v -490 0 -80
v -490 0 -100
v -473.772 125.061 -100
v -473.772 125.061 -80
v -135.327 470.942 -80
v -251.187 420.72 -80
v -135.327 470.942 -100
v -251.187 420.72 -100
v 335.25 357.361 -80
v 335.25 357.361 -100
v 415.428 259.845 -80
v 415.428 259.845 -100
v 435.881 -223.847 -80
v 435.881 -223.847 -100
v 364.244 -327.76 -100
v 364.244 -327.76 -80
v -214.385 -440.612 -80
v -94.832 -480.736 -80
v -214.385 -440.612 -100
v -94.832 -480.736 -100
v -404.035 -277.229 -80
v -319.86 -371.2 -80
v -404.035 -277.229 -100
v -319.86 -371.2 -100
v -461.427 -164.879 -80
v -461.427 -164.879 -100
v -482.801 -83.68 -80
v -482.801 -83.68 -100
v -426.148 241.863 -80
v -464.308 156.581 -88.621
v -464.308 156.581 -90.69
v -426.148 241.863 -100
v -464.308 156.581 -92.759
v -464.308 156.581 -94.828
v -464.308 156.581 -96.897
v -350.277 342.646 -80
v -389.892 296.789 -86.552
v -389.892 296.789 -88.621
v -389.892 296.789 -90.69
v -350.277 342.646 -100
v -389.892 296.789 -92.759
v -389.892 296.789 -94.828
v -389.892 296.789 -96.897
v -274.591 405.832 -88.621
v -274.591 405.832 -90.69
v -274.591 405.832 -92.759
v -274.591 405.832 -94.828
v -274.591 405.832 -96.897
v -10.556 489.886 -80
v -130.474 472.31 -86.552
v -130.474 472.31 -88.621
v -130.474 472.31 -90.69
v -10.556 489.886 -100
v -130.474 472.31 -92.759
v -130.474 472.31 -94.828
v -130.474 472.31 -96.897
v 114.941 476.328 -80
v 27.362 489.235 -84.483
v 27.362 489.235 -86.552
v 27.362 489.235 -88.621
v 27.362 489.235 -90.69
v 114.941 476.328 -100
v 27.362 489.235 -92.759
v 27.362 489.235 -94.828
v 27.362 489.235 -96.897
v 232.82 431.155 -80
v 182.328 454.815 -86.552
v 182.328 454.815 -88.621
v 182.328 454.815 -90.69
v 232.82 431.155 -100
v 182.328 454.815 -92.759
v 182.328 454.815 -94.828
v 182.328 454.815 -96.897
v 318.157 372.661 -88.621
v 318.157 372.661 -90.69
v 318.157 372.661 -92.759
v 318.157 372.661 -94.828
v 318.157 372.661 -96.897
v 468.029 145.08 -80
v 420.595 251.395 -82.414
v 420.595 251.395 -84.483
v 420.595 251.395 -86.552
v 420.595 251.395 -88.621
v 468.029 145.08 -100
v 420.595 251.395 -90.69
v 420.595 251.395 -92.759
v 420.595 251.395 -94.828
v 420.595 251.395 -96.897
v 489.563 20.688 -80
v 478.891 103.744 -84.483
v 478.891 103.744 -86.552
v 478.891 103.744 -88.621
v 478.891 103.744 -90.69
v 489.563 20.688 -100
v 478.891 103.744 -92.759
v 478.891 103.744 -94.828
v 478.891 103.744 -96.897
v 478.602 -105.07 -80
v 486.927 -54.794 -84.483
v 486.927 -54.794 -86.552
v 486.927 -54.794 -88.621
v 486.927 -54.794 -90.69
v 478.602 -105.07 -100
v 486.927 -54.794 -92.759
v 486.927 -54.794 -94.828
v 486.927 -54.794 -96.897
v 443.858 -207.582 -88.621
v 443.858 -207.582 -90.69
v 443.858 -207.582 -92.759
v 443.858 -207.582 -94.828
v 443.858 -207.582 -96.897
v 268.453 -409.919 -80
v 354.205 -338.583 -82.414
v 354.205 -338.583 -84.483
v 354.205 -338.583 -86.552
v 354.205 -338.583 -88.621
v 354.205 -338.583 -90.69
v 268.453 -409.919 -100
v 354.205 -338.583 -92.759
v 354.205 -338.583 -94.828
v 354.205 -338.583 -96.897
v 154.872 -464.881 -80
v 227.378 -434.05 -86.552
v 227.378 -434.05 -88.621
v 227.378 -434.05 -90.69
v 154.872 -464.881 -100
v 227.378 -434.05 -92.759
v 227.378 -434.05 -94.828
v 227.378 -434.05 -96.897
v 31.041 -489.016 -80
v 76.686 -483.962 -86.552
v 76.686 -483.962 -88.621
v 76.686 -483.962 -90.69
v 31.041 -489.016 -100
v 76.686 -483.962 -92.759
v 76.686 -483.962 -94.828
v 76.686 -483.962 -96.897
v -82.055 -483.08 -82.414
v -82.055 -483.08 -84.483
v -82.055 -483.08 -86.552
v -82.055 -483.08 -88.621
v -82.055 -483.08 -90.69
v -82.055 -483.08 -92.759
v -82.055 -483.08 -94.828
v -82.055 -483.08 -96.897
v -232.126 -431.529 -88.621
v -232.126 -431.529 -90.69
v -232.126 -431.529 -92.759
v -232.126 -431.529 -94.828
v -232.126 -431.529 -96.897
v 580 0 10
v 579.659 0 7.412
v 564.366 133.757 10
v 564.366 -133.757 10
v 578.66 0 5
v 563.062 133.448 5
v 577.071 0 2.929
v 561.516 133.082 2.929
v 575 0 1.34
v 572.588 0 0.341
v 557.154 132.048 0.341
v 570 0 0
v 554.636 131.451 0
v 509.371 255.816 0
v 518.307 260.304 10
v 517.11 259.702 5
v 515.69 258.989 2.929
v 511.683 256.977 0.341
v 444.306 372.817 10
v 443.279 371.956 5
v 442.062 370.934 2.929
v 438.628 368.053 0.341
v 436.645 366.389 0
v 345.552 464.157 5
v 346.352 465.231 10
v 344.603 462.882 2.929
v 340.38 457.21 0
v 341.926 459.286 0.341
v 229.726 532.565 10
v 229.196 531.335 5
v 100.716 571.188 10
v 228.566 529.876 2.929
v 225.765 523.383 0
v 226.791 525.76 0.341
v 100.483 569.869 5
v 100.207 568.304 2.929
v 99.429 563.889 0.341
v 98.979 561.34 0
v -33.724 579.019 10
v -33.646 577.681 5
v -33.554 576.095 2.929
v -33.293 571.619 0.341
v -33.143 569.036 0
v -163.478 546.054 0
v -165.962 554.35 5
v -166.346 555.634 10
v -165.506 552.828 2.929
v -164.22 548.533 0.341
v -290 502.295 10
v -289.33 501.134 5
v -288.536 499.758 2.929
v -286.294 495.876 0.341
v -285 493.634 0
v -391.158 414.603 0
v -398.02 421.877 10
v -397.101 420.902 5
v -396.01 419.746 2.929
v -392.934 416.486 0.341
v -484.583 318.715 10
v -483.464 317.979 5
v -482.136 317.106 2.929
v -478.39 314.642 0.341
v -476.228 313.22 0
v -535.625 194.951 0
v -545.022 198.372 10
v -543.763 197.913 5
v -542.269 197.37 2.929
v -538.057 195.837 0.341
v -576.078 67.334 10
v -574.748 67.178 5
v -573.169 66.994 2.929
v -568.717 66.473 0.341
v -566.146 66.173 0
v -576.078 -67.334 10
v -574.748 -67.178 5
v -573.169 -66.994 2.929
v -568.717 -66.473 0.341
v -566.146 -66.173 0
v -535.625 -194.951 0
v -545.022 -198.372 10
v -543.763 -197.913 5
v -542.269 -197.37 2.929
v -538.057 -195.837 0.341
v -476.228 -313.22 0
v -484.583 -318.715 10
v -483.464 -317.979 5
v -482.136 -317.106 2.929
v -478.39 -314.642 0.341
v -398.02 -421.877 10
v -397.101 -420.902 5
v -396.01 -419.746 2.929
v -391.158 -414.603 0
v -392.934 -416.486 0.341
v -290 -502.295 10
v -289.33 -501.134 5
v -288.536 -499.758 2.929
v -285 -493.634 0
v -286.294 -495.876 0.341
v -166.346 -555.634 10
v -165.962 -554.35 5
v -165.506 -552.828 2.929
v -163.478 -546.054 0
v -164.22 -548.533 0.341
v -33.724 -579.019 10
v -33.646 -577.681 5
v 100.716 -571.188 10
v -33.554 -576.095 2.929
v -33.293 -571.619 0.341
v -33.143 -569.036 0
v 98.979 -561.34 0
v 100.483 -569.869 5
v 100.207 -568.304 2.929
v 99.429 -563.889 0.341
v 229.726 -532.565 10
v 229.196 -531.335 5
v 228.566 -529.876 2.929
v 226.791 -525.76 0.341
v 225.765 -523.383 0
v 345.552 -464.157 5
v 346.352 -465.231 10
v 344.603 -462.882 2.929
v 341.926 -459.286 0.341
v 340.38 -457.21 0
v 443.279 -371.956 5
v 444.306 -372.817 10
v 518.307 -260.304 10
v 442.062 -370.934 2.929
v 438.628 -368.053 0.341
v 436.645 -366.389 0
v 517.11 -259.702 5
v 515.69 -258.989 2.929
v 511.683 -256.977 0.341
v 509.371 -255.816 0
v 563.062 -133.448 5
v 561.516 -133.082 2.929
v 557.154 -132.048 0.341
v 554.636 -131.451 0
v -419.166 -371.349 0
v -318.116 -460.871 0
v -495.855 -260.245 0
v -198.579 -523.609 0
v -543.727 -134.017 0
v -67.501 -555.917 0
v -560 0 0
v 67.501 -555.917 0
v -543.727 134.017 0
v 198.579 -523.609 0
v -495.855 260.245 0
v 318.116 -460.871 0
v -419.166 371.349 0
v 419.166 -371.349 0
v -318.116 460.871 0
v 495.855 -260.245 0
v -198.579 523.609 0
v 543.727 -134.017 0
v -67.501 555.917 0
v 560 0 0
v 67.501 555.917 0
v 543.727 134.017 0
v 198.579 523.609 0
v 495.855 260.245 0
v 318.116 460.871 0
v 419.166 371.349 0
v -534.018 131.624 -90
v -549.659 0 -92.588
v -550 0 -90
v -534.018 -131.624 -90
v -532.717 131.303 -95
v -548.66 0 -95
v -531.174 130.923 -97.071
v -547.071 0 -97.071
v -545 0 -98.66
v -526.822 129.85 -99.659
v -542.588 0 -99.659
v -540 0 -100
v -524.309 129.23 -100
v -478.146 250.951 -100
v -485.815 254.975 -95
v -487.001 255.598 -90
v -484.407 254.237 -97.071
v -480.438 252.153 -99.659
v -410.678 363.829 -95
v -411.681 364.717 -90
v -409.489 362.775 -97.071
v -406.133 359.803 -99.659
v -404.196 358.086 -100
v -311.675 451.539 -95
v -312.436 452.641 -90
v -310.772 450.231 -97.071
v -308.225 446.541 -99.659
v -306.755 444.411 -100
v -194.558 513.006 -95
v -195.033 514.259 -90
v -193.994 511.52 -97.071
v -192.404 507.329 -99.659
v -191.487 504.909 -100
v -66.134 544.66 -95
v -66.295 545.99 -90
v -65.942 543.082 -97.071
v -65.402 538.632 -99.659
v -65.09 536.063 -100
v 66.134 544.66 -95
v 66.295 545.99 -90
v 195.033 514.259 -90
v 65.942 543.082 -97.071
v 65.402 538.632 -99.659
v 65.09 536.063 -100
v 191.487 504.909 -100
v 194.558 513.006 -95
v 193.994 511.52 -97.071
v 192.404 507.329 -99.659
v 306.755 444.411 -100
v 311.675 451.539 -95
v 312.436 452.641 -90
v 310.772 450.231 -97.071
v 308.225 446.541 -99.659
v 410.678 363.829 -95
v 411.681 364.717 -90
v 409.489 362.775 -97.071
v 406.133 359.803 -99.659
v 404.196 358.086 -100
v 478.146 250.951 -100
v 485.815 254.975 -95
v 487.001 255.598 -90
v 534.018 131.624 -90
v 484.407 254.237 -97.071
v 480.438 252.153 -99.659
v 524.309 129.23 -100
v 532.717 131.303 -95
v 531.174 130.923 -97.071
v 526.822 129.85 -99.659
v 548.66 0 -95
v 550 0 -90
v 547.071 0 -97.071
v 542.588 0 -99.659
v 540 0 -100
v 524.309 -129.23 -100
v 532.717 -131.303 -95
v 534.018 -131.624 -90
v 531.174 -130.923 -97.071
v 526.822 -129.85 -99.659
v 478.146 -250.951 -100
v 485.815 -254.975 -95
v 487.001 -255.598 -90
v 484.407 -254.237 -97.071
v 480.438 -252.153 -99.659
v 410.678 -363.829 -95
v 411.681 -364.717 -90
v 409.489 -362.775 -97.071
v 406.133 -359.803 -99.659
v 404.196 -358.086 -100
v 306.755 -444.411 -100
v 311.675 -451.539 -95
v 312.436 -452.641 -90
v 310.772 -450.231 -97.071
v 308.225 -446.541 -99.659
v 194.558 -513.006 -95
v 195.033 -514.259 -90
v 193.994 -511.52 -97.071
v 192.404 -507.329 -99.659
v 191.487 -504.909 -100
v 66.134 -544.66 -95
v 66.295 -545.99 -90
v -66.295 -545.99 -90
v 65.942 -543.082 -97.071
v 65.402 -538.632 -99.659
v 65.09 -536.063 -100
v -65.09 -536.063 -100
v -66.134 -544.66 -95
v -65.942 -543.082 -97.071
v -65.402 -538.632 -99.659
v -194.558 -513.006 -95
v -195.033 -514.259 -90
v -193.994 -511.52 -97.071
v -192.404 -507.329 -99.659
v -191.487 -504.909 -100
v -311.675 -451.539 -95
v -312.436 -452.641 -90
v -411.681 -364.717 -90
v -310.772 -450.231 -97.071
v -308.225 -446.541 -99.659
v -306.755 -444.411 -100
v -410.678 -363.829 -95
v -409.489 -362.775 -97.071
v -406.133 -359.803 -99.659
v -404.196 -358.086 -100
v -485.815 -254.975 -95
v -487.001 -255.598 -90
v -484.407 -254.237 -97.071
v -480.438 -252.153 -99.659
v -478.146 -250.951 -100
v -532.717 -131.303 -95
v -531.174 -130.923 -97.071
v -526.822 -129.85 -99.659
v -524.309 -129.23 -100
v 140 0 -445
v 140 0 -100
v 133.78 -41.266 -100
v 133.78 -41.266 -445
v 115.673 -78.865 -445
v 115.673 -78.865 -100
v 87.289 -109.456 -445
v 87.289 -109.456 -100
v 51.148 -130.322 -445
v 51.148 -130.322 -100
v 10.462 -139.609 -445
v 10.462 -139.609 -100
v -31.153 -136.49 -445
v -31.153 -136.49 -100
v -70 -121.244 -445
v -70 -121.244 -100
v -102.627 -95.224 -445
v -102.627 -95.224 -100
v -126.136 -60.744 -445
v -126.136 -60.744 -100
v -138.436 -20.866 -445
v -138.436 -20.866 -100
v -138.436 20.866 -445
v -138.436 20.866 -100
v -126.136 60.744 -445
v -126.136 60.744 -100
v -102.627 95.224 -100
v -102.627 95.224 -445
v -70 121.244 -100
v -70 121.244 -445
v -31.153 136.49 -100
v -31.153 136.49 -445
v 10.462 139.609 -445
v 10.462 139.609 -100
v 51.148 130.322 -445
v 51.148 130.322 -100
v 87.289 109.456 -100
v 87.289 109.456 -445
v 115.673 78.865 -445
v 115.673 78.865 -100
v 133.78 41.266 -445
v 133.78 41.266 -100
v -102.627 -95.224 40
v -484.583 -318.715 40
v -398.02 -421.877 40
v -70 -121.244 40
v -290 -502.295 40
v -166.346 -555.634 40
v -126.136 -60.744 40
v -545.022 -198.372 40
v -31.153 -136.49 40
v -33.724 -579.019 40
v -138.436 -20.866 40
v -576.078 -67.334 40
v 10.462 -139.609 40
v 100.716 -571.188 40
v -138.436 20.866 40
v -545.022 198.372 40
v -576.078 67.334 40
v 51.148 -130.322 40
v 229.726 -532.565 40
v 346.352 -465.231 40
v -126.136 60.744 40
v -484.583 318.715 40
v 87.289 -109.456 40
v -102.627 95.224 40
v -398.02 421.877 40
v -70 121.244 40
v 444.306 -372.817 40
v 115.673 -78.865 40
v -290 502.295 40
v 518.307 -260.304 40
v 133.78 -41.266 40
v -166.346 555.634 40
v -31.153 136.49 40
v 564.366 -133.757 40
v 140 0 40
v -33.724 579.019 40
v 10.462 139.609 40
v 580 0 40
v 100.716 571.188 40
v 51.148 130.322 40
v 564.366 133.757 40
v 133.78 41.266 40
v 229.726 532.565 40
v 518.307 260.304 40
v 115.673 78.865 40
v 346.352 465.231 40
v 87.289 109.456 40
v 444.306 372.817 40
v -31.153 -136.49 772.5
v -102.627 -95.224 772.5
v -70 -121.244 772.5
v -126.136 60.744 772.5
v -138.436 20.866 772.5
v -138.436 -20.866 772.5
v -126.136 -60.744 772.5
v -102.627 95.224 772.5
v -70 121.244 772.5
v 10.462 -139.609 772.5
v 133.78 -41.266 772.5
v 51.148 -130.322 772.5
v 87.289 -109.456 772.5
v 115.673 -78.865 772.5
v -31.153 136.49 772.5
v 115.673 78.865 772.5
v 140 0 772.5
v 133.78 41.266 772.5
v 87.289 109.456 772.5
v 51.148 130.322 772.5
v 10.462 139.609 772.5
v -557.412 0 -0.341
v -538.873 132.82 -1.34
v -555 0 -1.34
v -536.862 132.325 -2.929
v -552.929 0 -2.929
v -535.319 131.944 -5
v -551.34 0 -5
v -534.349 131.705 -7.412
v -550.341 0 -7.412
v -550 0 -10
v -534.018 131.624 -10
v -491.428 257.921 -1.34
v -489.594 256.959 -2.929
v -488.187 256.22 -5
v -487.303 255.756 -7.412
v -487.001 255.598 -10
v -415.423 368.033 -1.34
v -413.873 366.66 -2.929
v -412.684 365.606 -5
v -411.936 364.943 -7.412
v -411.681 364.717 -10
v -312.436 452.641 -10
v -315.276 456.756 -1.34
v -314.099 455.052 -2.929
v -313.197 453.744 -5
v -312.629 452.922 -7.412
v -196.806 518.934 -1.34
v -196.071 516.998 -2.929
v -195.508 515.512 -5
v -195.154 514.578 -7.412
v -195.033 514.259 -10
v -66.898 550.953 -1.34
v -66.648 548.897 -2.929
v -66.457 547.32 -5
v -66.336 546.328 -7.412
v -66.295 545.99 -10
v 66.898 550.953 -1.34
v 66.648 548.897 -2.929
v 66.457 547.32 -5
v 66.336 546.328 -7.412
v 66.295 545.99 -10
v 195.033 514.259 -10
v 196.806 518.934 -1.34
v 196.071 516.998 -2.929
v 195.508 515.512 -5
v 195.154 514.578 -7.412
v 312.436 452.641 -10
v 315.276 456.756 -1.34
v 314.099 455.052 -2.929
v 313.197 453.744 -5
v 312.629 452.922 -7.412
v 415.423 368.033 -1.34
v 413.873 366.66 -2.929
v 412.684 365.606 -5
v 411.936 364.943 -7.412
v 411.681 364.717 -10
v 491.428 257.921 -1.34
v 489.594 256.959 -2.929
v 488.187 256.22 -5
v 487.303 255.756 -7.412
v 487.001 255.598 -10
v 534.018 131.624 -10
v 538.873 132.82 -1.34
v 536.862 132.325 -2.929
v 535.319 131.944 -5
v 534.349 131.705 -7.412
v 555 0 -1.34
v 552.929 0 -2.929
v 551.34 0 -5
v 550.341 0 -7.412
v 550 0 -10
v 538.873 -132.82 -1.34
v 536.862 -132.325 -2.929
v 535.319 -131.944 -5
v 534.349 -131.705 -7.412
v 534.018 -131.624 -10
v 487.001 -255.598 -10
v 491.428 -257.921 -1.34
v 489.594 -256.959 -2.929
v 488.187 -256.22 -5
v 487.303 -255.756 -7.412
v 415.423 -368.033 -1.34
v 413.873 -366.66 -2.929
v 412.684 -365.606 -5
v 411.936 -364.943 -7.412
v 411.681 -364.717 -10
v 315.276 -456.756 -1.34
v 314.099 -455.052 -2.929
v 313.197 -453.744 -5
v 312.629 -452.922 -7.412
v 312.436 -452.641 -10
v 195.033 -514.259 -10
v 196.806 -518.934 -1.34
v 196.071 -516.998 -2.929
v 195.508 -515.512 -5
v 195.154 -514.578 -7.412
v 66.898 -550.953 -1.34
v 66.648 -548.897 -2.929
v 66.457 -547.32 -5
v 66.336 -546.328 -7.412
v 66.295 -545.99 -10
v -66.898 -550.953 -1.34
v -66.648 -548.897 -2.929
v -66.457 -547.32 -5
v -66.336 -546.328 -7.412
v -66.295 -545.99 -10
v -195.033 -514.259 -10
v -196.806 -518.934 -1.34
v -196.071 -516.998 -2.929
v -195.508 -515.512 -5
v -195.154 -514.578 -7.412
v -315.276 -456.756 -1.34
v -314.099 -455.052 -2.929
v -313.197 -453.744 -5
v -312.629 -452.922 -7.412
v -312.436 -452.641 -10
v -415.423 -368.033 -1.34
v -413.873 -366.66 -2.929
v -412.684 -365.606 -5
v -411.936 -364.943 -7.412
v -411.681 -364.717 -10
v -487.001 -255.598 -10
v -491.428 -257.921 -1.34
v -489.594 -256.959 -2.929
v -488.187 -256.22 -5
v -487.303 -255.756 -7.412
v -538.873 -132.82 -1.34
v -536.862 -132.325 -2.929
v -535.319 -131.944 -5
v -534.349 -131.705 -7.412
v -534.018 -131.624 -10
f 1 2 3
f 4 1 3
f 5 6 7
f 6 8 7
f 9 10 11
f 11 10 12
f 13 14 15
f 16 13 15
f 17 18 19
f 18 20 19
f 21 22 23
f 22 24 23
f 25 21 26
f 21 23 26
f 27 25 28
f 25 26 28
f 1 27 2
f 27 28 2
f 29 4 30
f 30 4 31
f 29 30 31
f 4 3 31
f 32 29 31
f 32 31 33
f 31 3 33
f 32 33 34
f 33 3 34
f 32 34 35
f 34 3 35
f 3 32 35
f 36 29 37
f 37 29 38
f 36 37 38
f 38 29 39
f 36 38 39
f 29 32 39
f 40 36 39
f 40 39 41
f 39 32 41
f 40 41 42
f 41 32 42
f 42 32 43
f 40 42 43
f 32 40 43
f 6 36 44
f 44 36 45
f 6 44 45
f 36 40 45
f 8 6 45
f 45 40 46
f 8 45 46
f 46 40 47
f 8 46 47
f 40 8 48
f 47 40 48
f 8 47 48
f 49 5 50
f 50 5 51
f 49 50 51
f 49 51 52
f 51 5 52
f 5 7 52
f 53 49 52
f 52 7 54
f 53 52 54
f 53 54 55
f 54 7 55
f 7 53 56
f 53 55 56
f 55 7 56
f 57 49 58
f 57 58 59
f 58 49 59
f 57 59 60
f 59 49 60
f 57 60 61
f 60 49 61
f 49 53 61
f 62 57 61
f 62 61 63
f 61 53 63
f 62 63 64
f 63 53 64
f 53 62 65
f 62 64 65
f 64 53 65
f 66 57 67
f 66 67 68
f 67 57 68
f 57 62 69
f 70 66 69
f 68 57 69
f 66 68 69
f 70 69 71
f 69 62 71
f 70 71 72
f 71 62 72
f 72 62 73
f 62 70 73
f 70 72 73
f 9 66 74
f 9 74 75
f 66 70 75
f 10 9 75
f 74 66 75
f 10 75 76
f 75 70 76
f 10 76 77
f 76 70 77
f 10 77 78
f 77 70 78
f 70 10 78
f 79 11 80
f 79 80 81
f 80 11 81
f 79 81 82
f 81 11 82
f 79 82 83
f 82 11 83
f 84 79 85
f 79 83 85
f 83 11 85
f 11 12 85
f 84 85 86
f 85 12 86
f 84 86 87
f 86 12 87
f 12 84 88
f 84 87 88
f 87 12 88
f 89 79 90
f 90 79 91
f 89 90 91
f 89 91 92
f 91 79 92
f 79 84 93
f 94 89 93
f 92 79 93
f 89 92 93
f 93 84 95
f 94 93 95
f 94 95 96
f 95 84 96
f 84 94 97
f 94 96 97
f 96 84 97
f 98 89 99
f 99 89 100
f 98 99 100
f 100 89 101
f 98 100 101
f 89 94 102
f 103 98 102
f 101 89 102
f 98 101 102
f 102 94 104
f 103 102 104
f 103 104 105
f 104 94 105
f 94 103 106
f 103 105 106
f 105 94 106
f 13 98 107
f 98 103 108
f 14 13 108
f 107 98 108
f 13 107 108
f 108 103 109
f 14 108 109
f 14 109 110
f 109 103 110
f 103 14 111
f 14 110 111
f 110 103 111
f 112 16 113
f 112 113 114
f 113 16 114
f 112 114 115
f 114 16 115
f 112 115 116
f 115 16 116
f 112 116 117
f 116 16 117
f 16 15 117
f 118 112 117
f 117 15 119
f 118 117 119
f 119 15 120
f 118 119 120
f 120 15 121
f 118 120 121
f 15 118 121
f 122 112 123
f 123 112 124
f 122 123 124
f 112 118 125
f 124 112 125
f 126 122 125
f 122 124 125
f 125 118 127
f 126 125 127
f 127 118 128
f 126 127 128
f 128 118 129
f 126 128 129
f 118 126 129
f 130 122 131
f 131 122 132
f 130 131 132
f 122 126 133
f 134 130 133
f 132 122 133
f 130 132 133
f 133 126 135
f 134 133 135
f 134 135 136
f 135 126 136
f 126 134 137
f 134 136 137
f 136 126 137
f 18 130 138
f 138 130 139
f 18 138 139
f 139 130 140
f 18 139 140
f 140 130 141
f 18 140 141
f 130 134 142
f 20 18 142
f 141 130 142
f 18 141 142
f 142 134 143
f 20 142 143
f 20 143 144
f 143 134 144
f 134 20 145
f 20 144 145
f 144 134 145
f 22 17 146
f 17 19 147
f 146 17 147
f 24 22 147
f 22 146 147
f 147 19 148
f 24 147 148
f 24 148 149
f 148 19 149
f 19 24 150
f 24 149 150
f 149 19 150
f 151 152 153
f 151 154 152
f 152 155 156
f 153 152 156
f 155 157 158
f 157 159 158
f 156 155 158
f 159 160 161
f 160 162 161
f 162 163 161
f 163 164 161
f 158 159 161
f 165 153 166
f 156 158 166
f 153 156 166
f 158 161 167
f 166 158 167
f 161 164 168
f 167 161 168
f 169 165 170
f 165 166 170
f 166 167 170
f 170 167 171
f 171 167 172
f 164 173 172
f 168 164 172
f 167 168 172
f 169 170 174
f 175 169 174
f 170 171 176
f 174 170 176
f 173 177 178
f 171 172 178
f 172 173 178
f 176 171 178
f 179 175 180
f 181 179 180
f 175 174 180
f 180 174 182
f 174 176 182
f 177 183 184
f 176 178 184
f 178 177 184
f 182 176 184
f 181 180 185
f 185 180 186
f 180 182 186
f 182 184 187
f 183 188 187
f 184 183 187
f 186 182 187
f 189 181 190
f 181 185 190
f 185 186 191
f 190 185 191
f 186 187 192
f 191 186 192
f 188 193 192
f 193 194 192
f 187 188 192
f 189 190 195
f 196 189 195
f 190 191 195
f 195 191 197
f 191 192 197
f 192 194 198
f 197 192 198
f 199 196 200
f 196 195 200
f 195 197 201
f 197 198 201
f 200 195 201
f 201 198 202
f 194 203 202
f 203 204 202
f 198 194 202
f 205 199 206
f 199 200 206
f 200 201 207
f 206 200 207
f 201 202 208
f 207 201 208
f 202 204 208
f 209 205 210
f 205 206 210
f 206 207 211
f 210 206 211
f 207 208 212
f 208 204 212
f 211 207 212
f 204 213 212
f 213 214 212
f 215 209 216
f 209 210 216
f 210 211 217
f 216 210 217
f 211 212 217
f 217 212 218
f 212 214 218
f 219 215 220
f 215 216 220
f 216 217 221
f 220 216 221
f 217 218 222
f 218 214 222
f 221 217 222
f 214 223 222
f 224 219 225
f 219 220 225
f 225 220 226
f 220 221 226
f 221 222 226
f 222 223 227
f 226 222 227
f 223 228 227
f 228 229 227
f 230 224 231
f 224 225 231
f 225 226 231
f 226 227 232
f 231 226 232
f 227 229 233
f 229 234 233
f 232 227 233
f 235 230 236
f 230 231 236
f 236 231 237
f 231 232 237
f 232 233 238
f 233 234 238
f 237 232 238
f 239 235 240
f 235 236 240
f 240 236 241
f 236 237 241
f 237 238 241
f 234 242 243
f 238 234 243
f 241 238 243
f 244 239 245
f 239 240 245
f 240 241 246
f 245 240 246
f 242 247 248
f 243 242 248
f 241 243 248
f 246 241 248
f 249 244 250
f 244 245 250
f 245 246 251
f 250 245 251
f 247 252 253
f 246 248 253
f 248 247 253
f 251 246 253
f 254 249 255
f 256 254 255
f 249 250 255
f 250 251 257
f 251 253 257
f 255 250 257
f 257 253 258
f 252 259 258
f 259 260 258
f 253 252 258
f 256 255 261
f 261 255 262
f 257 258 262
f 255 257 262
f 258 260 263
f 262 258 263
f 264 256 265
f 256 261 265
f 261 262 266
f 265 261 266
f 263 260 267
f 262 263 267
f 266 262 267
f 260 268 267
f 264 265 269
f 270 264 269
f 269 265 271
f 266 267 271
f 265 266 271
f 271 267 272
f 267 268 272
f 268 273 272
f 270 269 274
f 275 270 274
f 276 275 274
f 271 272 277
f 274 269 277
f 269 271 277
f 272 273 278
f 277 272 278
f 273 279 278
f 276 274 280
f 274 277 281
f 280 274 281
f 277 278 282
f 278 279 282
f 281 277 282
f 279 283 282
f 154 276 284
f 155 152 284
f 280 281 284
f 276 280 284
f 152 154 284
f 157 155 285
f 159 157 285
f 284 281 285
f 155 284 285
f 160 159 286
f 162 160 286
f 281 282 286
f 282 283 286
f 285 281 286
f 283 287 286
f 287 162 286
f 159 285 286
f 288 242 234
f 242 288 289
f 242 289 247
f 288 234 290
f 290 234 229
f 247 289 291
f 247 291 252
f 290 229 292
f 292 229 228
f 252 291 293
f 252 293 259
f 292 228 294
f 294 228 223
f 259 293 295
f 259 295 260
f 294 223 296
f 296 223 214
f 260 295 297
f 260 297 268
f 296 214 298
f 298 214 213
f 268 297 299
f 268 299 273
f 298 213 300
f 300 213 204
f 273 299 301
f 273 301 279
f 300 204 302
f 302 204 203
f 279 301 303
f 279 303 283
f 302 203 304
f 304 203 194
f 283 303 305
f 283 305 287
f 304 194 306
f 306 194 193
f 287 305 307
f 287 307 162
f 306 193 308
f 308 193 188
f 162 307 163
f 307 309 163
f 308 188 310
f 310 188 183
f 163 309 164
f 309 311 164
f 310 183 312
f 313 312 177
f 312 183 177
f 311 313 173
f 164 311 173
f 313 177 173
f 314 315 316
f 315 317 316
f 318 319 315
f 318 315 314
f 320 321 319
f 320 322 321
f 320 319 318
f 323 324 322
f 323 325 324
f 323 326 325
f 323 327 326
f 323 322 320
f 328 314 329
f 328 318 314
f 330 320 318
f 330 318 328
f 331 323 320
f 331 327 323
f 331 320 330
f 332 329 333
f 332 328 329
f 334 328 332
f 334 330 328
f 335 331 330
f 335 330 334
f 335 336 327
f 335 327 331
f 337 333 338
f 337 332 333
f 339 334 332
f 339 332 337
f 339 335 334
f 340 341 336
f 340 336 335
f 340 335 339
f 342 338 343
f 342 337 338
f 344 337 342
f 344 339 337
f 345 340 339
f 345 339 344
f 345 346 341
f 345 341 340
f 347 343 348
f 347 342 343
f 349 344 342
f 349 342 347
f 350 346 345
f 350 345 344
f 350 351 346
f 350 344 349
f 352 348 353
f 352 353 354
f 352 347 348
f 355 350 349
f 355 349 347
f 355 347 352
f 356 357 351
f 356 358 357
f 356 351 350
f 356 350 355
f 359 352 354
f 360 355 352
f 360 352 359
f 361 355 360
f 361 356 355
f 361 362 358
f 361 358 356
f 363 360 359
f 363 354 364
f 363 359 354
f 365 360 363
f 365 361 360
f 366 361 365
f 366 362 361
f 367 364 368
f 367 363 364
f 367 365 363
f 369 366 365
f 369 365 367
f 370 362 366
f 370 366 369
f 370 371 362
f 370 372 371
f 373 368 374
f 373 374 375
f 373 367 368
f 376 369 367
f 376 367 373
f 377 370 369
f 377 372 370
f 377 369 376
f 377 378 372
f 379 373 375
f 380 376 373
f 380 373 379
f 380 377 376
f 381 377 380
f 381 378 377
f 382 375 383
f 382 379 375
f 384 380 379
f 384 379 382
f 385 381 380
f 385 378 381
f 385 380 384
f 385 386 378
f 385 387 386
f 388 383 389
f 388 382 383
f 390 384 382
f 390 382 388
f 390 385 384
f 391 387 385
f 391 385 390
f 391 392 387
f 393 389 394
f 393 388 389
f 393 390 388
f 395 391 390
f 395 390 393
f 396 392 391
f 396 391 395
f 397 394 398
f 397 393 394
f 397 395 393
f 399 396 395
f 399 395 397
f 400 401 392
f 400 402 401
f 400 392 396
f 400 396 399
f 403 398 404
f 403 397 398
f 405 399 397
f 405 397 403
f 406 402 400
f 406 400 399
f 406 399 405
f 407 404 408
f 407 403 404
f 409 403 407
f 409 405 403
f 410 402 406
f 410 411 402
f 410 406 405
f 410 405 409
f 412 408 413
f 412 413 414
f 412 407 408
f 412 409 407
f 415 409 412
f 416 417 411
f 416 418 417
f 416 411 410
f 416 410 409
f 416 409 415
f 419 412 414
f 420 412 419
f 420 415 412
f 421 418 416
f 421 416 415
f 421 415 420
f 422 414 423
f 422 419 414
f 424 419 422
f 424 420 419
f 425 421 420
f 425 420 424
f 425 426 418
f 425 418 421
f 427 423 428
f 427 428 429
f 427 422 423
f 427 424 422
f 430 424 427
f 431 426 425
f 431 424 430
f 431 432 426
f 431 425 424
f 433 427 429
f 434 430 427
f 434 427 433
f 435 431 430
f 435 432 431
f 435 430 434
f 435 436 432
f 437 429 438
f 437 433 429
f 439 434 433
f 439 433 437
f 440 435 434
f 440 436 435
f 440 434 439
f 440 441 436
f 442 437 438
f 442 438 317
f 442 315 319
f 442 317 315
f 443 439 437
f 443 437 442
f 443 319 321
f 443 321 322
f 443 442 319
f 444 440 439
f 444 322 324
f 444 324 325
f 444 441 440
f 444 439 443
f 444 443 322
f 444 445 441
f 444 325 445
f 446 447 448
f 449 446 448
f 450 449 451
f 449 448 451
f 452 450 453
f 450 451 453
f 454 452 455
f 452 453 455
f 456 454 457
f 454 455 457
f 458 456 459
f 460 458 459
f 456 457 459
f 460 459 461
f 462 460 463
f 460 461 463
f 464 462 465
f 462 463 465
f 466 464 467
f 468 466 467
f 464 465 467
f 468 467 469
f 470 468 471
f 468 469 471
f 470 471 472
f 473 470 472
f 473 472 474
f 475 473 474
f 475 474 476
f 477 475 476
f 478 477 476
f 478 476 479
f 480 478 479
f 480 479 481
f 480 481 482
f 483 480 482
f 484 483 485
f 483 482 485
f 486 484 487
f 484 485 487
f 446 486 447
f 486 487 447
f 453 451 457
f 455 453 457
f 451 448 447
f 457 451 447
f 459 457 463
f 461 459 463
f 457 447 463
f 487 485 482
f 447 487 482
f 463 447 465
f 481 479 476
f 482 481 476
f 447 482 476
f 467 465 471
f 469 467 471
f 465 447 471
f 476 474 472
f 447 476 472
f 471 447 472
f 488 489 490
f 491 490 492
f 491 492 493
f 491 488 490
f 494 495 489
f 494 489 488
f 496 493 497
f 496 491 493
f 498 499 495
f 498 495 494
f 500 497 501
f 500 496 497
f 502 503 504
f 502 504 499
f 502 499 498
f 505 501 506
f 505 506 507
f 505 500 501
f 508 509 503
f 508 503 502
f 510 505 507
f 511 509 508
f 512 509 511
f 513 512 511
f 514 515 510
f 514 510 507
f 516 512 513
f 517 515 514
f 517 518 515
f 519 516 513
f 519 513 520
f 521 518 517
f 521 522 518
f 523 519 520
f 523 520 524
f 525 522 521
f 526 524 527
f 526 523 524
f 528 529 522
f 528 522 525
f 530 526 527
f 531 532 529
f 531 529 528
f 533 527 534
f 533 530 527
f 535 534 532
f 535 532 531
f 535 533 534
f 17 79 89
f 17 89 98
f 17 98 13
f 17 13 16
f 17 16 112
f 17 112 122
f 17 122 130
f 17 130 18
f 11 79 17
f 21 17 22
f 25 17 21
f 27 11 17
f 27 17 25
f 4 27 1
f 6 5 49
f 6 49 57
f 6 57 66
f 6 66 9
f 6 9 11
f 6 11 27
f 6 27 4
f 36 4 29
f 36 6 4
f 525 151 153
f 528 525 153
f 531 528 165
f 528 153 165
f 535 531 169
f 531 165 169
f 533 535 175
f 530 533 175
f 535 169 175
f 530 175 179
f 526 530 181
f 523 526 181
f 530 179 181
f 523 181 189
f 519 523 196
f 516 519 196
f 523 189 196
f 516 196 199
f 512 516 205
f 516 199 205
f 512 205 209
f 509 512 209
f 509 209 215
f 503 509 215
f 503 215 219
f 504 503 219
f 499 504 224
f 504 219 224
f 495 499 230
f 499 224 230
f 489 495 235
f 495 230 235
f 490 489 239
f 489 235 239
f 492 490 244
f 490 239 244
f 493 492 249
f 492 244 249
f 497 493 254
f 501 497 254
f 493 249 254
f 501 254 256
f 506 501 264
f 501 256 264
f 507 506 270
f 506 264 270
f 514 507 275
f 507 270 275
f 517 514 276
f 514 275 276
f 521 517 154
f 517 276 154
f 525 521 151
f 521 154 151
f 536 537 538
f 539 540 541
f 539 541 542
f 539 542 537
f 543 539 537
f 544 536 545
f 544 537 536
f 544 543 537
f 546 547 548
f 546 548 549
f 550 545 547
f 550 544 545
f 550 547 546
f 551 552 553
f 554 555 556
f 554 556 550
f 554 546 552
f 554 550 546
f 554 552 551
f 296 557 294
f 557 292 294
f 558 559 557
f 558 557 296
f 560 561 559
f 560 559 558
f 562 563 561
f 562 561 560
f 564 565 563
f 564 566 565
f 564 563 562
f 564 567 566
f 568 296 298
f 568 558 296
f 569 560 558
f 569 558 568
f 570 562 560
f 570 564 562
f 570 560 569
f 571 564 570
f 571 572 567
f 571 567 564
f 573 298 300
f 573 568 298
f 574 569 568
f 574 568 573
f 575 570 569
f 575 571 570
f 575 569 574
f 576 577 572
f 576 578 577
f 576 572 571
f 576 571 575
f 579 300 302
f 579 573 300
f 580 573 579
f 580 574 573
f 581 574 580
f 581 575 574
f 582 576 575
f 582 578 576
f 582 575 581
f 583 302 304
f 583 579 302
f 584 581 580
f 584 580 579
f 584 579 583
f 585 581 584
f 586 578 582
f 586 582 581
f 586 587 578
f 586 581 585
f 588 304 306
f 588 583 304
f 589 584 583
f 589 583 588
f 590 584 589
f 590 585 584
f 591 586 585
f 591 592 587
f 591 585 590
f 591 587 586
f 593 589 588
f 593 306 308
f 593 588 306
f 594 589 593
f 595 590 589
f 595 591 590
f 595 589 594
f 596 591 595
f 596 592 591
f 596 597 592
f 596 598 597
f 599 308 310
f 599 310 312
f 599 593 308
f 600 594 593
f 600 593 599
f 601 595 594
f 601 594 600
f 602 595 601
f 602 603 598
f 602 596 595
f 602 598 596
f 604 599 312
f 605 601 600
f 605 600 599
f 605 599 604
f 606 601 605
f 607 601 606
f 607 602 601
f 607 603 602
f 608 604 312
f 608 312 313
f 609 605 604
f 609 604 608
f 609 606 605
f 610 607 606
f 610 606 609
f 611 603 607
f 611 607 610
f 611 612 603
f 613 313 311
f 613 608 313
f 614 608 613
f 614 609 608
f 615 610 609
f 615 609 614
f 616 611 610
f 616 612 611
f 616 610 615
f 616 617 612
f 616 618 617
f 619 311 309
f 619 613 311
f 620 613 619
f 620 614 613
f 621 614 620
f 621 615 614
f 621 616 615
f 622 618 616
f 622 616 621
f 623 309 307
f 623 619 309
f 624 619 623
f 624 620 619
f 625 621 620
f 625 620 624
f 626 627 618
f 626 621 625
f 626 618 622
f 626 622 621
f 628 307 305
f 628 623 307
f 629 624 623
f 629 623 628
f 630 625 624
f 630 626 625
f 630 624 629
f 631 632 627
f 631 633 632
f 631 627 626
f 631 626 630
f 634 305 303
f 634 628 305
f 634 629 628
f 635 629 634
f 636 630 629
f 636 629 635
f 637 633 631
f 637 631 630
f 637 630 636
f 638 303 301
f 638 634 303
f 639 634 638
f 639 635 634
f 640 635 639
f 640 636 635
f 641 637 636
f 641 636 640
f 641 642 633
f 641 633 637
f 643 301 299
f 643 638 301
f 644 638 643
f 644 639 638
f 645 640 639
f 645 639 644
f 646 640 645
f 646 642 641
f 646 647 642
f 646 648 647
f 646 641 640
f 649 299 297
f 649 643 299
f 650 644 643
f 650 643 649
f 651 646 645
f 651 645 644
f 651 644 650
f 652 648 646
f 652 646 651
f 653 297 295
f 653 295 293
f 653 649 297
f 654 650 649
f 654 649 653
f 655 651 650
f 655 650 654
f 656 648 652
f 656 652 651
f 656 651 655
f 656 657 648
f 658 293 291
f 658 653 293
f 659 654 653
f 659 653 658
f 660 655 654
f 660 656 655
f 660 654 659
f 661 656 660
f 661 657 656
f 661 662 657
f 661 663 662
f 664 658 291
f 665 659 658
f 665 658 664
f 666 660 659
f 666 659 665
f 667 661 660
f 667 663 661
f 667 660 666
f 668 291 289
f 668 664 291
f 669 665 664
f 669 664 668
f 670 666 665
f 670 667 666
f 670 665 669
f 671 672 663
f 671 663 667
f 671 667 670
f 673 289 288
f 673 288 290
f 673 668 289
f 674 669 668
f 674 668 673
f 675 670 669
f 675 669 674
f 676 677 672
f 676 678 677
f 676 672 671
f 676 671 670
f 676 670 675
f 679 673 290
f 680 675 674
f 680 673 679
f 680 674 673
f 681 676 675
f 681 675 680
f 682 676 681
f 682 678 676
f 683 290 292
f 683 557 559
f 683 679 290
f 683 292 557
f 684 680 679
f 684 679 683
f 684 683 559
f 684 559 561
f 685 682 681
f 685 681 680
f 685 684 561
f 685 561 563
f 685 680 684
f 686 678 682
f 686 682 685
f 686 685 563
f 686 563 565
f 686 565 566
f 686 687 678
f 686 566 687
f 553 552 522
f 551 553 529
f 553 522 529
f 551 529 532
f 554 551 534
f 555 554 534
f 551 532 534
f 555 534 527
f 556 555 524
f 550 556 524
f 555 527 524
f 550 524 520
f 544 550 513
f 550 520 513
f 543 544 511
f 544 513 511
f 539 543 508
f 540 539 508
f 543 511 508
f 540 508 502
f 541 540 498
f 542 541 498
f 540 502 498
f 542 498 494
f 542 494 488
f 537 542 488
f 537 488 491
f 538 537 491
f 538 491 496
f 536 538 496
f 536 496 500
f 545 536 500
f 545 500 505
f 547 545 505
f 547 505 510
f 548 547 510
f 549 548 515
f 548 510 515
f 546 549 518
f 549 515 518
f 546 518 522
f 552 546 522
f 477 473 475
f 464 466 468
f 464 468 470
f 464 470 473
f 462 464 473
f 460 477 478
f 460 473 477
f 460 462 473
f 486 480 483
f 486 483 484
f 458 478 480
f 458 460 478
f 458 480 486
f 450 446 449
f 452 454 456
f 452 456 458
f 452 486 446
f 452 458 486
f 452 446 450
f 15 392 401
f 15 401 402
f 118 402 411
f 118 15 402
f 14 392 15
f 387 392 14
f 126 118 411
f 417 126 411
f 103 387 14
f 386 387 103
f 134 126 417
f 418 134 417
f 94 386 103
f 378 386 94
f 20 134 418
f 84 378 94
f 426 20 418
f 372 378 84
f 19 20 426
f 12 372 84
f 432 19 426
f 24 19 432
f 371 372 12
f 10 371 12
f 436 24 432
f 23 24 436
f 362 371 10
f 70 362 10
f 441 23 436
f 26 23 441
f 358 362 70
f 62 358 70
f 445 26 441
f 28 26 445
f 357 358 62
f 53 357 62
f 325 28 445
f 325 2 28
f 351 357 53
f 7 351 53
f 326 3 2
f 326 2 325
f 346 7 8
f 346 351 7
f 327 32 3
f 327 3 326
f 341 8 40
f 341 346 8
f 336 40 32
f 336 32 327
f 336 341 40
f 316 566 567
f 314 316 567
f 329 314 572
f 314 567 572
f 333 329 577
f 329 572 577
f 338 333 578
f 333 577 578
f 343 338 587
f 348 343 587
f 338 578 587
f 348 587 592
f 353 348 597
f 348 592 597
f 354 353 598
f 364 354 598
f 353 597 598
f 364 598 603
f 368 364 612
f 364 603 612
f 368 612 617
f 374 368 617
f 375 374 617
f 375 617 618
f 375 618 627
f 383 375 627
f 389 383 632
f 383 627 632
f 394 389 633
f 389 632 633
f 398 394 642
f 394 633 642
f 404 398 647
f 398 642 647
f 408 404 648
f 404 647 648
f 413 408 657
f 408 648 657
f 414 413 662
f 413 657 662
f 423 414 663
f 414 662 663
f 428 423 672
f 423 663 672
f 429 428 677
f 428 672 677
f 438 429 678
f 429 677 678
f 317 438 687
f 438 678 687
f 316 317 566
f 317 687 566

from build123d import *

# Parameters (mm, degrees)
SCHIZZO4_R                   = 580
ESTRUSIONE_ESTRUSIONE1_DEPTH = 40
SCHIZZO5_R                   = 550
ESTRUSIONE_ESTRUSIONE2_DEPTH = 100
RACCORDO4_R                  = 10
RACCORDO3_R                  = 10
SCHIZZO6_R                   = 140
ESTRUSIONE_ESTRUSIONE3_DEPTH = 732.5
SCHIZZO8_R                   = 140
ESTRUSIONE_ESTRUSIONE4_DEPTH = 345
TAGLIO_ESTRUSIONE2_DEPTH     = 20


with BuildPart() as part:
    # Schizzo4 → Estrusione-Estrusione1 (new body)
    with BuildSketch(Plane.XY):
        Circle(SCHIZZO4_R)
    extrude(amount=ESTRUSIONE_ESTRUSIONE1_DEPTH)

    # Schizzo5 → Estrusione-Estrusione2 (add)
    with BuildSketch(Plane(origin=(0, 0, 0), x_dir=(-1, 0, 0), z_dir=(0, 0, -1))):
        Circle(SCHIZZO5_R)
    extrude(amount=ESTRUSIONE_ESTRUSIONE2_DEPTH)

    # Raccordo4
    raccordo4_edges = [part.edges().sort_by_distance(p)[0] for p in [
        (-580, 0, 0),
        (550, 0, 0),
    ]]
    fillet(raccordo4_edges, radius=RACCORDO4_R)

    # Raccordo3
    raccordo3_edges = [part.edges().sort_by_distance(p)[0] for p in [
        (550, 0, -100),
    ]]
    fillet(raccordo3_edges, radius=RACCORDO3_R)

    # Schizzo6 → Estrusione-Estrusione3 (add)
    with BuildSketch(Plane.XY.offset(40)):
        Circle(SCHIZZO6_R)
    extrude(amount=ESTRUSIONE_ESTRUSIONE3_DEPTH)

    # Schizzo8 → Estrusione-Estrusione4 (add)
    with BuildSketch(Plane(origin=(0, 0, -100), x_dir=(-1, 0, 0), z_dir=(0, 0, -1))):
        with Locations(Location((0, 0, 0), (0, 0, 180))):
            Circle(SCHIZZO8_R)
    extrude(amount=ESTRUSIONE_ESTRUSIONE4_DEPTH)

    # Schizzo3D1 → Taglio-Estrusione2 (cut)
    with BuildSketch(Plane(origin=(-490, 0, -100), x_dir=(0.9999994625775602, -0.0010367471199618189, 0), z_dir=(0, 0, 1))):
        with BuildLine():
            add(Edge.make_bspline(
                [(0, 0), (-0.012889025, 12.324775606), (0.892505318, 36.969516199), (5.031720953, 73.734080783), (11.930813088, 110.08041258), (21.551001502, 145.804732388), (36.55920901, 188.443583214), (59.310799707, 236.88933115), (92.353568708, 289.032909391), (126.446679246, 330.291660739), (158.595093697, 362.068978642), (186.79160637, 386.021723619), (216.712322863, 407.779392219), (248.189766305, 427.220231533), (288.329062139, 448.008823547), (338.086656252, 467.724996678), (397.879393929, 483.086996482), (459.13037451, 490.830349457), (520.867876847, 490.830323821), (582.11818298, 483.087577434), (641.913744877, 467.724202681), (699.310395142, 444.982855454), (753.401739088, 415.222640068), (803.333606643, 378.913514395), (848.317503701, 336.628848258), (887.643073475, 289.036374583), (920.689311341, 236.887643526), (946.934372059, 181.006154856), (965.963810233, 122.274353668), (977.477125024, 61.619695392), (981.29250545, 0), (977.349701439, -61.611673282), (965.710975256, -122.242391905), (946.560118305, -180.934713942), (920.199548763, -236.761807382), (887.045536191, -288.842086137), (847.621627278, -336.353131282), (802.550381275, -378.544678935), (752.543527929, -414.750465128), (698.39076934, -444.39875755), (640.947156342, -467.021344687), (581.120157602, -482.2610762), (519.85319651, -489.876955394), (458.11871347, -489.749987888), (405.034017684, -482.926445703), (361.005254012, -472.689424768), (325.702985951, -461.620298825), (291.337369241, -447.921765869), (258.100752256, -431.67047026), (219.103056071, -408.812251082), (175.880382447, -377.246047708), (130.988657581, -334.872583225), (96.982463241, -293.542168627), (71.913392038, -255.927535867), (53.772486211, -223.683394901), (38.115010499, -190.16489219), (25.028466811, -155.559863125), (12.36477641, -112.517739342), (2.563418858, -60.5980959), (0.021119176, -20.194630929), (0, 0)],
                knots=[0, 0, 0, 0, 0.012011675, 0.024023503, 0.036035247, 0.04804697, 0.060058723, 0.080069863, 0.100081004, 0.120092144, 0.132103892, 0.144115629, 0.156127383, 0.168139121, 0.180150868, 0.200162009, 0.220173149, 0.240184289, 0.26019543, 0.28020657, 0.300217711, 0.320228851, 0.340239992, 0.360251132, 0.380262272, 0.400273413, 0.420284553, 0.440295694, 0.460306834, 0.480317974, 0.500329115, 0.520340255, 0.540351396, 0.560362536, 0.580373677, 0.600384817, 0.620395957, 0.640407098, 0.660418238, 0.680429379, 0.700440519, 0.72045166, 0.7404628, 0.76047394, 0.780485081, 0.792496828, 0.804508566, 0.81652032, 0.828532057, 0.840543805, 0.860554945, 0.880566085, 0.900577226, 0.912588972, 0.924600713, 0.936612469, 0.948624184, 0.96063595, 0.980318397, 1, 1, 1, 1], degree=3))
        make_face()
    extrude(amount=TAGLIO_ESTRUSIONE2_DEPTH, mode=Mode.SUBTRACT)


with BuildPart() as taglio_estrusione2_piece_1:
    # of the separate pieces the step leaves, piece 1, a body of its own (taglio_estrusione2_pieces)
    add(part.part.solids().sort_by_distance((-550, 0, -90))[0])


with BuildPart() as taglio_estrusione2_piece_2:
    # of the separate pieces the step leaves, piece 2, a body of its own (taglio_estrusione2_pieces)
    add(part.part.solids().sort_by_distance((140, 0, -100))[0])


solid = Compound([taglio_estrusione2_piece_1.part, taglio_estrusione2_piece_2.part])
